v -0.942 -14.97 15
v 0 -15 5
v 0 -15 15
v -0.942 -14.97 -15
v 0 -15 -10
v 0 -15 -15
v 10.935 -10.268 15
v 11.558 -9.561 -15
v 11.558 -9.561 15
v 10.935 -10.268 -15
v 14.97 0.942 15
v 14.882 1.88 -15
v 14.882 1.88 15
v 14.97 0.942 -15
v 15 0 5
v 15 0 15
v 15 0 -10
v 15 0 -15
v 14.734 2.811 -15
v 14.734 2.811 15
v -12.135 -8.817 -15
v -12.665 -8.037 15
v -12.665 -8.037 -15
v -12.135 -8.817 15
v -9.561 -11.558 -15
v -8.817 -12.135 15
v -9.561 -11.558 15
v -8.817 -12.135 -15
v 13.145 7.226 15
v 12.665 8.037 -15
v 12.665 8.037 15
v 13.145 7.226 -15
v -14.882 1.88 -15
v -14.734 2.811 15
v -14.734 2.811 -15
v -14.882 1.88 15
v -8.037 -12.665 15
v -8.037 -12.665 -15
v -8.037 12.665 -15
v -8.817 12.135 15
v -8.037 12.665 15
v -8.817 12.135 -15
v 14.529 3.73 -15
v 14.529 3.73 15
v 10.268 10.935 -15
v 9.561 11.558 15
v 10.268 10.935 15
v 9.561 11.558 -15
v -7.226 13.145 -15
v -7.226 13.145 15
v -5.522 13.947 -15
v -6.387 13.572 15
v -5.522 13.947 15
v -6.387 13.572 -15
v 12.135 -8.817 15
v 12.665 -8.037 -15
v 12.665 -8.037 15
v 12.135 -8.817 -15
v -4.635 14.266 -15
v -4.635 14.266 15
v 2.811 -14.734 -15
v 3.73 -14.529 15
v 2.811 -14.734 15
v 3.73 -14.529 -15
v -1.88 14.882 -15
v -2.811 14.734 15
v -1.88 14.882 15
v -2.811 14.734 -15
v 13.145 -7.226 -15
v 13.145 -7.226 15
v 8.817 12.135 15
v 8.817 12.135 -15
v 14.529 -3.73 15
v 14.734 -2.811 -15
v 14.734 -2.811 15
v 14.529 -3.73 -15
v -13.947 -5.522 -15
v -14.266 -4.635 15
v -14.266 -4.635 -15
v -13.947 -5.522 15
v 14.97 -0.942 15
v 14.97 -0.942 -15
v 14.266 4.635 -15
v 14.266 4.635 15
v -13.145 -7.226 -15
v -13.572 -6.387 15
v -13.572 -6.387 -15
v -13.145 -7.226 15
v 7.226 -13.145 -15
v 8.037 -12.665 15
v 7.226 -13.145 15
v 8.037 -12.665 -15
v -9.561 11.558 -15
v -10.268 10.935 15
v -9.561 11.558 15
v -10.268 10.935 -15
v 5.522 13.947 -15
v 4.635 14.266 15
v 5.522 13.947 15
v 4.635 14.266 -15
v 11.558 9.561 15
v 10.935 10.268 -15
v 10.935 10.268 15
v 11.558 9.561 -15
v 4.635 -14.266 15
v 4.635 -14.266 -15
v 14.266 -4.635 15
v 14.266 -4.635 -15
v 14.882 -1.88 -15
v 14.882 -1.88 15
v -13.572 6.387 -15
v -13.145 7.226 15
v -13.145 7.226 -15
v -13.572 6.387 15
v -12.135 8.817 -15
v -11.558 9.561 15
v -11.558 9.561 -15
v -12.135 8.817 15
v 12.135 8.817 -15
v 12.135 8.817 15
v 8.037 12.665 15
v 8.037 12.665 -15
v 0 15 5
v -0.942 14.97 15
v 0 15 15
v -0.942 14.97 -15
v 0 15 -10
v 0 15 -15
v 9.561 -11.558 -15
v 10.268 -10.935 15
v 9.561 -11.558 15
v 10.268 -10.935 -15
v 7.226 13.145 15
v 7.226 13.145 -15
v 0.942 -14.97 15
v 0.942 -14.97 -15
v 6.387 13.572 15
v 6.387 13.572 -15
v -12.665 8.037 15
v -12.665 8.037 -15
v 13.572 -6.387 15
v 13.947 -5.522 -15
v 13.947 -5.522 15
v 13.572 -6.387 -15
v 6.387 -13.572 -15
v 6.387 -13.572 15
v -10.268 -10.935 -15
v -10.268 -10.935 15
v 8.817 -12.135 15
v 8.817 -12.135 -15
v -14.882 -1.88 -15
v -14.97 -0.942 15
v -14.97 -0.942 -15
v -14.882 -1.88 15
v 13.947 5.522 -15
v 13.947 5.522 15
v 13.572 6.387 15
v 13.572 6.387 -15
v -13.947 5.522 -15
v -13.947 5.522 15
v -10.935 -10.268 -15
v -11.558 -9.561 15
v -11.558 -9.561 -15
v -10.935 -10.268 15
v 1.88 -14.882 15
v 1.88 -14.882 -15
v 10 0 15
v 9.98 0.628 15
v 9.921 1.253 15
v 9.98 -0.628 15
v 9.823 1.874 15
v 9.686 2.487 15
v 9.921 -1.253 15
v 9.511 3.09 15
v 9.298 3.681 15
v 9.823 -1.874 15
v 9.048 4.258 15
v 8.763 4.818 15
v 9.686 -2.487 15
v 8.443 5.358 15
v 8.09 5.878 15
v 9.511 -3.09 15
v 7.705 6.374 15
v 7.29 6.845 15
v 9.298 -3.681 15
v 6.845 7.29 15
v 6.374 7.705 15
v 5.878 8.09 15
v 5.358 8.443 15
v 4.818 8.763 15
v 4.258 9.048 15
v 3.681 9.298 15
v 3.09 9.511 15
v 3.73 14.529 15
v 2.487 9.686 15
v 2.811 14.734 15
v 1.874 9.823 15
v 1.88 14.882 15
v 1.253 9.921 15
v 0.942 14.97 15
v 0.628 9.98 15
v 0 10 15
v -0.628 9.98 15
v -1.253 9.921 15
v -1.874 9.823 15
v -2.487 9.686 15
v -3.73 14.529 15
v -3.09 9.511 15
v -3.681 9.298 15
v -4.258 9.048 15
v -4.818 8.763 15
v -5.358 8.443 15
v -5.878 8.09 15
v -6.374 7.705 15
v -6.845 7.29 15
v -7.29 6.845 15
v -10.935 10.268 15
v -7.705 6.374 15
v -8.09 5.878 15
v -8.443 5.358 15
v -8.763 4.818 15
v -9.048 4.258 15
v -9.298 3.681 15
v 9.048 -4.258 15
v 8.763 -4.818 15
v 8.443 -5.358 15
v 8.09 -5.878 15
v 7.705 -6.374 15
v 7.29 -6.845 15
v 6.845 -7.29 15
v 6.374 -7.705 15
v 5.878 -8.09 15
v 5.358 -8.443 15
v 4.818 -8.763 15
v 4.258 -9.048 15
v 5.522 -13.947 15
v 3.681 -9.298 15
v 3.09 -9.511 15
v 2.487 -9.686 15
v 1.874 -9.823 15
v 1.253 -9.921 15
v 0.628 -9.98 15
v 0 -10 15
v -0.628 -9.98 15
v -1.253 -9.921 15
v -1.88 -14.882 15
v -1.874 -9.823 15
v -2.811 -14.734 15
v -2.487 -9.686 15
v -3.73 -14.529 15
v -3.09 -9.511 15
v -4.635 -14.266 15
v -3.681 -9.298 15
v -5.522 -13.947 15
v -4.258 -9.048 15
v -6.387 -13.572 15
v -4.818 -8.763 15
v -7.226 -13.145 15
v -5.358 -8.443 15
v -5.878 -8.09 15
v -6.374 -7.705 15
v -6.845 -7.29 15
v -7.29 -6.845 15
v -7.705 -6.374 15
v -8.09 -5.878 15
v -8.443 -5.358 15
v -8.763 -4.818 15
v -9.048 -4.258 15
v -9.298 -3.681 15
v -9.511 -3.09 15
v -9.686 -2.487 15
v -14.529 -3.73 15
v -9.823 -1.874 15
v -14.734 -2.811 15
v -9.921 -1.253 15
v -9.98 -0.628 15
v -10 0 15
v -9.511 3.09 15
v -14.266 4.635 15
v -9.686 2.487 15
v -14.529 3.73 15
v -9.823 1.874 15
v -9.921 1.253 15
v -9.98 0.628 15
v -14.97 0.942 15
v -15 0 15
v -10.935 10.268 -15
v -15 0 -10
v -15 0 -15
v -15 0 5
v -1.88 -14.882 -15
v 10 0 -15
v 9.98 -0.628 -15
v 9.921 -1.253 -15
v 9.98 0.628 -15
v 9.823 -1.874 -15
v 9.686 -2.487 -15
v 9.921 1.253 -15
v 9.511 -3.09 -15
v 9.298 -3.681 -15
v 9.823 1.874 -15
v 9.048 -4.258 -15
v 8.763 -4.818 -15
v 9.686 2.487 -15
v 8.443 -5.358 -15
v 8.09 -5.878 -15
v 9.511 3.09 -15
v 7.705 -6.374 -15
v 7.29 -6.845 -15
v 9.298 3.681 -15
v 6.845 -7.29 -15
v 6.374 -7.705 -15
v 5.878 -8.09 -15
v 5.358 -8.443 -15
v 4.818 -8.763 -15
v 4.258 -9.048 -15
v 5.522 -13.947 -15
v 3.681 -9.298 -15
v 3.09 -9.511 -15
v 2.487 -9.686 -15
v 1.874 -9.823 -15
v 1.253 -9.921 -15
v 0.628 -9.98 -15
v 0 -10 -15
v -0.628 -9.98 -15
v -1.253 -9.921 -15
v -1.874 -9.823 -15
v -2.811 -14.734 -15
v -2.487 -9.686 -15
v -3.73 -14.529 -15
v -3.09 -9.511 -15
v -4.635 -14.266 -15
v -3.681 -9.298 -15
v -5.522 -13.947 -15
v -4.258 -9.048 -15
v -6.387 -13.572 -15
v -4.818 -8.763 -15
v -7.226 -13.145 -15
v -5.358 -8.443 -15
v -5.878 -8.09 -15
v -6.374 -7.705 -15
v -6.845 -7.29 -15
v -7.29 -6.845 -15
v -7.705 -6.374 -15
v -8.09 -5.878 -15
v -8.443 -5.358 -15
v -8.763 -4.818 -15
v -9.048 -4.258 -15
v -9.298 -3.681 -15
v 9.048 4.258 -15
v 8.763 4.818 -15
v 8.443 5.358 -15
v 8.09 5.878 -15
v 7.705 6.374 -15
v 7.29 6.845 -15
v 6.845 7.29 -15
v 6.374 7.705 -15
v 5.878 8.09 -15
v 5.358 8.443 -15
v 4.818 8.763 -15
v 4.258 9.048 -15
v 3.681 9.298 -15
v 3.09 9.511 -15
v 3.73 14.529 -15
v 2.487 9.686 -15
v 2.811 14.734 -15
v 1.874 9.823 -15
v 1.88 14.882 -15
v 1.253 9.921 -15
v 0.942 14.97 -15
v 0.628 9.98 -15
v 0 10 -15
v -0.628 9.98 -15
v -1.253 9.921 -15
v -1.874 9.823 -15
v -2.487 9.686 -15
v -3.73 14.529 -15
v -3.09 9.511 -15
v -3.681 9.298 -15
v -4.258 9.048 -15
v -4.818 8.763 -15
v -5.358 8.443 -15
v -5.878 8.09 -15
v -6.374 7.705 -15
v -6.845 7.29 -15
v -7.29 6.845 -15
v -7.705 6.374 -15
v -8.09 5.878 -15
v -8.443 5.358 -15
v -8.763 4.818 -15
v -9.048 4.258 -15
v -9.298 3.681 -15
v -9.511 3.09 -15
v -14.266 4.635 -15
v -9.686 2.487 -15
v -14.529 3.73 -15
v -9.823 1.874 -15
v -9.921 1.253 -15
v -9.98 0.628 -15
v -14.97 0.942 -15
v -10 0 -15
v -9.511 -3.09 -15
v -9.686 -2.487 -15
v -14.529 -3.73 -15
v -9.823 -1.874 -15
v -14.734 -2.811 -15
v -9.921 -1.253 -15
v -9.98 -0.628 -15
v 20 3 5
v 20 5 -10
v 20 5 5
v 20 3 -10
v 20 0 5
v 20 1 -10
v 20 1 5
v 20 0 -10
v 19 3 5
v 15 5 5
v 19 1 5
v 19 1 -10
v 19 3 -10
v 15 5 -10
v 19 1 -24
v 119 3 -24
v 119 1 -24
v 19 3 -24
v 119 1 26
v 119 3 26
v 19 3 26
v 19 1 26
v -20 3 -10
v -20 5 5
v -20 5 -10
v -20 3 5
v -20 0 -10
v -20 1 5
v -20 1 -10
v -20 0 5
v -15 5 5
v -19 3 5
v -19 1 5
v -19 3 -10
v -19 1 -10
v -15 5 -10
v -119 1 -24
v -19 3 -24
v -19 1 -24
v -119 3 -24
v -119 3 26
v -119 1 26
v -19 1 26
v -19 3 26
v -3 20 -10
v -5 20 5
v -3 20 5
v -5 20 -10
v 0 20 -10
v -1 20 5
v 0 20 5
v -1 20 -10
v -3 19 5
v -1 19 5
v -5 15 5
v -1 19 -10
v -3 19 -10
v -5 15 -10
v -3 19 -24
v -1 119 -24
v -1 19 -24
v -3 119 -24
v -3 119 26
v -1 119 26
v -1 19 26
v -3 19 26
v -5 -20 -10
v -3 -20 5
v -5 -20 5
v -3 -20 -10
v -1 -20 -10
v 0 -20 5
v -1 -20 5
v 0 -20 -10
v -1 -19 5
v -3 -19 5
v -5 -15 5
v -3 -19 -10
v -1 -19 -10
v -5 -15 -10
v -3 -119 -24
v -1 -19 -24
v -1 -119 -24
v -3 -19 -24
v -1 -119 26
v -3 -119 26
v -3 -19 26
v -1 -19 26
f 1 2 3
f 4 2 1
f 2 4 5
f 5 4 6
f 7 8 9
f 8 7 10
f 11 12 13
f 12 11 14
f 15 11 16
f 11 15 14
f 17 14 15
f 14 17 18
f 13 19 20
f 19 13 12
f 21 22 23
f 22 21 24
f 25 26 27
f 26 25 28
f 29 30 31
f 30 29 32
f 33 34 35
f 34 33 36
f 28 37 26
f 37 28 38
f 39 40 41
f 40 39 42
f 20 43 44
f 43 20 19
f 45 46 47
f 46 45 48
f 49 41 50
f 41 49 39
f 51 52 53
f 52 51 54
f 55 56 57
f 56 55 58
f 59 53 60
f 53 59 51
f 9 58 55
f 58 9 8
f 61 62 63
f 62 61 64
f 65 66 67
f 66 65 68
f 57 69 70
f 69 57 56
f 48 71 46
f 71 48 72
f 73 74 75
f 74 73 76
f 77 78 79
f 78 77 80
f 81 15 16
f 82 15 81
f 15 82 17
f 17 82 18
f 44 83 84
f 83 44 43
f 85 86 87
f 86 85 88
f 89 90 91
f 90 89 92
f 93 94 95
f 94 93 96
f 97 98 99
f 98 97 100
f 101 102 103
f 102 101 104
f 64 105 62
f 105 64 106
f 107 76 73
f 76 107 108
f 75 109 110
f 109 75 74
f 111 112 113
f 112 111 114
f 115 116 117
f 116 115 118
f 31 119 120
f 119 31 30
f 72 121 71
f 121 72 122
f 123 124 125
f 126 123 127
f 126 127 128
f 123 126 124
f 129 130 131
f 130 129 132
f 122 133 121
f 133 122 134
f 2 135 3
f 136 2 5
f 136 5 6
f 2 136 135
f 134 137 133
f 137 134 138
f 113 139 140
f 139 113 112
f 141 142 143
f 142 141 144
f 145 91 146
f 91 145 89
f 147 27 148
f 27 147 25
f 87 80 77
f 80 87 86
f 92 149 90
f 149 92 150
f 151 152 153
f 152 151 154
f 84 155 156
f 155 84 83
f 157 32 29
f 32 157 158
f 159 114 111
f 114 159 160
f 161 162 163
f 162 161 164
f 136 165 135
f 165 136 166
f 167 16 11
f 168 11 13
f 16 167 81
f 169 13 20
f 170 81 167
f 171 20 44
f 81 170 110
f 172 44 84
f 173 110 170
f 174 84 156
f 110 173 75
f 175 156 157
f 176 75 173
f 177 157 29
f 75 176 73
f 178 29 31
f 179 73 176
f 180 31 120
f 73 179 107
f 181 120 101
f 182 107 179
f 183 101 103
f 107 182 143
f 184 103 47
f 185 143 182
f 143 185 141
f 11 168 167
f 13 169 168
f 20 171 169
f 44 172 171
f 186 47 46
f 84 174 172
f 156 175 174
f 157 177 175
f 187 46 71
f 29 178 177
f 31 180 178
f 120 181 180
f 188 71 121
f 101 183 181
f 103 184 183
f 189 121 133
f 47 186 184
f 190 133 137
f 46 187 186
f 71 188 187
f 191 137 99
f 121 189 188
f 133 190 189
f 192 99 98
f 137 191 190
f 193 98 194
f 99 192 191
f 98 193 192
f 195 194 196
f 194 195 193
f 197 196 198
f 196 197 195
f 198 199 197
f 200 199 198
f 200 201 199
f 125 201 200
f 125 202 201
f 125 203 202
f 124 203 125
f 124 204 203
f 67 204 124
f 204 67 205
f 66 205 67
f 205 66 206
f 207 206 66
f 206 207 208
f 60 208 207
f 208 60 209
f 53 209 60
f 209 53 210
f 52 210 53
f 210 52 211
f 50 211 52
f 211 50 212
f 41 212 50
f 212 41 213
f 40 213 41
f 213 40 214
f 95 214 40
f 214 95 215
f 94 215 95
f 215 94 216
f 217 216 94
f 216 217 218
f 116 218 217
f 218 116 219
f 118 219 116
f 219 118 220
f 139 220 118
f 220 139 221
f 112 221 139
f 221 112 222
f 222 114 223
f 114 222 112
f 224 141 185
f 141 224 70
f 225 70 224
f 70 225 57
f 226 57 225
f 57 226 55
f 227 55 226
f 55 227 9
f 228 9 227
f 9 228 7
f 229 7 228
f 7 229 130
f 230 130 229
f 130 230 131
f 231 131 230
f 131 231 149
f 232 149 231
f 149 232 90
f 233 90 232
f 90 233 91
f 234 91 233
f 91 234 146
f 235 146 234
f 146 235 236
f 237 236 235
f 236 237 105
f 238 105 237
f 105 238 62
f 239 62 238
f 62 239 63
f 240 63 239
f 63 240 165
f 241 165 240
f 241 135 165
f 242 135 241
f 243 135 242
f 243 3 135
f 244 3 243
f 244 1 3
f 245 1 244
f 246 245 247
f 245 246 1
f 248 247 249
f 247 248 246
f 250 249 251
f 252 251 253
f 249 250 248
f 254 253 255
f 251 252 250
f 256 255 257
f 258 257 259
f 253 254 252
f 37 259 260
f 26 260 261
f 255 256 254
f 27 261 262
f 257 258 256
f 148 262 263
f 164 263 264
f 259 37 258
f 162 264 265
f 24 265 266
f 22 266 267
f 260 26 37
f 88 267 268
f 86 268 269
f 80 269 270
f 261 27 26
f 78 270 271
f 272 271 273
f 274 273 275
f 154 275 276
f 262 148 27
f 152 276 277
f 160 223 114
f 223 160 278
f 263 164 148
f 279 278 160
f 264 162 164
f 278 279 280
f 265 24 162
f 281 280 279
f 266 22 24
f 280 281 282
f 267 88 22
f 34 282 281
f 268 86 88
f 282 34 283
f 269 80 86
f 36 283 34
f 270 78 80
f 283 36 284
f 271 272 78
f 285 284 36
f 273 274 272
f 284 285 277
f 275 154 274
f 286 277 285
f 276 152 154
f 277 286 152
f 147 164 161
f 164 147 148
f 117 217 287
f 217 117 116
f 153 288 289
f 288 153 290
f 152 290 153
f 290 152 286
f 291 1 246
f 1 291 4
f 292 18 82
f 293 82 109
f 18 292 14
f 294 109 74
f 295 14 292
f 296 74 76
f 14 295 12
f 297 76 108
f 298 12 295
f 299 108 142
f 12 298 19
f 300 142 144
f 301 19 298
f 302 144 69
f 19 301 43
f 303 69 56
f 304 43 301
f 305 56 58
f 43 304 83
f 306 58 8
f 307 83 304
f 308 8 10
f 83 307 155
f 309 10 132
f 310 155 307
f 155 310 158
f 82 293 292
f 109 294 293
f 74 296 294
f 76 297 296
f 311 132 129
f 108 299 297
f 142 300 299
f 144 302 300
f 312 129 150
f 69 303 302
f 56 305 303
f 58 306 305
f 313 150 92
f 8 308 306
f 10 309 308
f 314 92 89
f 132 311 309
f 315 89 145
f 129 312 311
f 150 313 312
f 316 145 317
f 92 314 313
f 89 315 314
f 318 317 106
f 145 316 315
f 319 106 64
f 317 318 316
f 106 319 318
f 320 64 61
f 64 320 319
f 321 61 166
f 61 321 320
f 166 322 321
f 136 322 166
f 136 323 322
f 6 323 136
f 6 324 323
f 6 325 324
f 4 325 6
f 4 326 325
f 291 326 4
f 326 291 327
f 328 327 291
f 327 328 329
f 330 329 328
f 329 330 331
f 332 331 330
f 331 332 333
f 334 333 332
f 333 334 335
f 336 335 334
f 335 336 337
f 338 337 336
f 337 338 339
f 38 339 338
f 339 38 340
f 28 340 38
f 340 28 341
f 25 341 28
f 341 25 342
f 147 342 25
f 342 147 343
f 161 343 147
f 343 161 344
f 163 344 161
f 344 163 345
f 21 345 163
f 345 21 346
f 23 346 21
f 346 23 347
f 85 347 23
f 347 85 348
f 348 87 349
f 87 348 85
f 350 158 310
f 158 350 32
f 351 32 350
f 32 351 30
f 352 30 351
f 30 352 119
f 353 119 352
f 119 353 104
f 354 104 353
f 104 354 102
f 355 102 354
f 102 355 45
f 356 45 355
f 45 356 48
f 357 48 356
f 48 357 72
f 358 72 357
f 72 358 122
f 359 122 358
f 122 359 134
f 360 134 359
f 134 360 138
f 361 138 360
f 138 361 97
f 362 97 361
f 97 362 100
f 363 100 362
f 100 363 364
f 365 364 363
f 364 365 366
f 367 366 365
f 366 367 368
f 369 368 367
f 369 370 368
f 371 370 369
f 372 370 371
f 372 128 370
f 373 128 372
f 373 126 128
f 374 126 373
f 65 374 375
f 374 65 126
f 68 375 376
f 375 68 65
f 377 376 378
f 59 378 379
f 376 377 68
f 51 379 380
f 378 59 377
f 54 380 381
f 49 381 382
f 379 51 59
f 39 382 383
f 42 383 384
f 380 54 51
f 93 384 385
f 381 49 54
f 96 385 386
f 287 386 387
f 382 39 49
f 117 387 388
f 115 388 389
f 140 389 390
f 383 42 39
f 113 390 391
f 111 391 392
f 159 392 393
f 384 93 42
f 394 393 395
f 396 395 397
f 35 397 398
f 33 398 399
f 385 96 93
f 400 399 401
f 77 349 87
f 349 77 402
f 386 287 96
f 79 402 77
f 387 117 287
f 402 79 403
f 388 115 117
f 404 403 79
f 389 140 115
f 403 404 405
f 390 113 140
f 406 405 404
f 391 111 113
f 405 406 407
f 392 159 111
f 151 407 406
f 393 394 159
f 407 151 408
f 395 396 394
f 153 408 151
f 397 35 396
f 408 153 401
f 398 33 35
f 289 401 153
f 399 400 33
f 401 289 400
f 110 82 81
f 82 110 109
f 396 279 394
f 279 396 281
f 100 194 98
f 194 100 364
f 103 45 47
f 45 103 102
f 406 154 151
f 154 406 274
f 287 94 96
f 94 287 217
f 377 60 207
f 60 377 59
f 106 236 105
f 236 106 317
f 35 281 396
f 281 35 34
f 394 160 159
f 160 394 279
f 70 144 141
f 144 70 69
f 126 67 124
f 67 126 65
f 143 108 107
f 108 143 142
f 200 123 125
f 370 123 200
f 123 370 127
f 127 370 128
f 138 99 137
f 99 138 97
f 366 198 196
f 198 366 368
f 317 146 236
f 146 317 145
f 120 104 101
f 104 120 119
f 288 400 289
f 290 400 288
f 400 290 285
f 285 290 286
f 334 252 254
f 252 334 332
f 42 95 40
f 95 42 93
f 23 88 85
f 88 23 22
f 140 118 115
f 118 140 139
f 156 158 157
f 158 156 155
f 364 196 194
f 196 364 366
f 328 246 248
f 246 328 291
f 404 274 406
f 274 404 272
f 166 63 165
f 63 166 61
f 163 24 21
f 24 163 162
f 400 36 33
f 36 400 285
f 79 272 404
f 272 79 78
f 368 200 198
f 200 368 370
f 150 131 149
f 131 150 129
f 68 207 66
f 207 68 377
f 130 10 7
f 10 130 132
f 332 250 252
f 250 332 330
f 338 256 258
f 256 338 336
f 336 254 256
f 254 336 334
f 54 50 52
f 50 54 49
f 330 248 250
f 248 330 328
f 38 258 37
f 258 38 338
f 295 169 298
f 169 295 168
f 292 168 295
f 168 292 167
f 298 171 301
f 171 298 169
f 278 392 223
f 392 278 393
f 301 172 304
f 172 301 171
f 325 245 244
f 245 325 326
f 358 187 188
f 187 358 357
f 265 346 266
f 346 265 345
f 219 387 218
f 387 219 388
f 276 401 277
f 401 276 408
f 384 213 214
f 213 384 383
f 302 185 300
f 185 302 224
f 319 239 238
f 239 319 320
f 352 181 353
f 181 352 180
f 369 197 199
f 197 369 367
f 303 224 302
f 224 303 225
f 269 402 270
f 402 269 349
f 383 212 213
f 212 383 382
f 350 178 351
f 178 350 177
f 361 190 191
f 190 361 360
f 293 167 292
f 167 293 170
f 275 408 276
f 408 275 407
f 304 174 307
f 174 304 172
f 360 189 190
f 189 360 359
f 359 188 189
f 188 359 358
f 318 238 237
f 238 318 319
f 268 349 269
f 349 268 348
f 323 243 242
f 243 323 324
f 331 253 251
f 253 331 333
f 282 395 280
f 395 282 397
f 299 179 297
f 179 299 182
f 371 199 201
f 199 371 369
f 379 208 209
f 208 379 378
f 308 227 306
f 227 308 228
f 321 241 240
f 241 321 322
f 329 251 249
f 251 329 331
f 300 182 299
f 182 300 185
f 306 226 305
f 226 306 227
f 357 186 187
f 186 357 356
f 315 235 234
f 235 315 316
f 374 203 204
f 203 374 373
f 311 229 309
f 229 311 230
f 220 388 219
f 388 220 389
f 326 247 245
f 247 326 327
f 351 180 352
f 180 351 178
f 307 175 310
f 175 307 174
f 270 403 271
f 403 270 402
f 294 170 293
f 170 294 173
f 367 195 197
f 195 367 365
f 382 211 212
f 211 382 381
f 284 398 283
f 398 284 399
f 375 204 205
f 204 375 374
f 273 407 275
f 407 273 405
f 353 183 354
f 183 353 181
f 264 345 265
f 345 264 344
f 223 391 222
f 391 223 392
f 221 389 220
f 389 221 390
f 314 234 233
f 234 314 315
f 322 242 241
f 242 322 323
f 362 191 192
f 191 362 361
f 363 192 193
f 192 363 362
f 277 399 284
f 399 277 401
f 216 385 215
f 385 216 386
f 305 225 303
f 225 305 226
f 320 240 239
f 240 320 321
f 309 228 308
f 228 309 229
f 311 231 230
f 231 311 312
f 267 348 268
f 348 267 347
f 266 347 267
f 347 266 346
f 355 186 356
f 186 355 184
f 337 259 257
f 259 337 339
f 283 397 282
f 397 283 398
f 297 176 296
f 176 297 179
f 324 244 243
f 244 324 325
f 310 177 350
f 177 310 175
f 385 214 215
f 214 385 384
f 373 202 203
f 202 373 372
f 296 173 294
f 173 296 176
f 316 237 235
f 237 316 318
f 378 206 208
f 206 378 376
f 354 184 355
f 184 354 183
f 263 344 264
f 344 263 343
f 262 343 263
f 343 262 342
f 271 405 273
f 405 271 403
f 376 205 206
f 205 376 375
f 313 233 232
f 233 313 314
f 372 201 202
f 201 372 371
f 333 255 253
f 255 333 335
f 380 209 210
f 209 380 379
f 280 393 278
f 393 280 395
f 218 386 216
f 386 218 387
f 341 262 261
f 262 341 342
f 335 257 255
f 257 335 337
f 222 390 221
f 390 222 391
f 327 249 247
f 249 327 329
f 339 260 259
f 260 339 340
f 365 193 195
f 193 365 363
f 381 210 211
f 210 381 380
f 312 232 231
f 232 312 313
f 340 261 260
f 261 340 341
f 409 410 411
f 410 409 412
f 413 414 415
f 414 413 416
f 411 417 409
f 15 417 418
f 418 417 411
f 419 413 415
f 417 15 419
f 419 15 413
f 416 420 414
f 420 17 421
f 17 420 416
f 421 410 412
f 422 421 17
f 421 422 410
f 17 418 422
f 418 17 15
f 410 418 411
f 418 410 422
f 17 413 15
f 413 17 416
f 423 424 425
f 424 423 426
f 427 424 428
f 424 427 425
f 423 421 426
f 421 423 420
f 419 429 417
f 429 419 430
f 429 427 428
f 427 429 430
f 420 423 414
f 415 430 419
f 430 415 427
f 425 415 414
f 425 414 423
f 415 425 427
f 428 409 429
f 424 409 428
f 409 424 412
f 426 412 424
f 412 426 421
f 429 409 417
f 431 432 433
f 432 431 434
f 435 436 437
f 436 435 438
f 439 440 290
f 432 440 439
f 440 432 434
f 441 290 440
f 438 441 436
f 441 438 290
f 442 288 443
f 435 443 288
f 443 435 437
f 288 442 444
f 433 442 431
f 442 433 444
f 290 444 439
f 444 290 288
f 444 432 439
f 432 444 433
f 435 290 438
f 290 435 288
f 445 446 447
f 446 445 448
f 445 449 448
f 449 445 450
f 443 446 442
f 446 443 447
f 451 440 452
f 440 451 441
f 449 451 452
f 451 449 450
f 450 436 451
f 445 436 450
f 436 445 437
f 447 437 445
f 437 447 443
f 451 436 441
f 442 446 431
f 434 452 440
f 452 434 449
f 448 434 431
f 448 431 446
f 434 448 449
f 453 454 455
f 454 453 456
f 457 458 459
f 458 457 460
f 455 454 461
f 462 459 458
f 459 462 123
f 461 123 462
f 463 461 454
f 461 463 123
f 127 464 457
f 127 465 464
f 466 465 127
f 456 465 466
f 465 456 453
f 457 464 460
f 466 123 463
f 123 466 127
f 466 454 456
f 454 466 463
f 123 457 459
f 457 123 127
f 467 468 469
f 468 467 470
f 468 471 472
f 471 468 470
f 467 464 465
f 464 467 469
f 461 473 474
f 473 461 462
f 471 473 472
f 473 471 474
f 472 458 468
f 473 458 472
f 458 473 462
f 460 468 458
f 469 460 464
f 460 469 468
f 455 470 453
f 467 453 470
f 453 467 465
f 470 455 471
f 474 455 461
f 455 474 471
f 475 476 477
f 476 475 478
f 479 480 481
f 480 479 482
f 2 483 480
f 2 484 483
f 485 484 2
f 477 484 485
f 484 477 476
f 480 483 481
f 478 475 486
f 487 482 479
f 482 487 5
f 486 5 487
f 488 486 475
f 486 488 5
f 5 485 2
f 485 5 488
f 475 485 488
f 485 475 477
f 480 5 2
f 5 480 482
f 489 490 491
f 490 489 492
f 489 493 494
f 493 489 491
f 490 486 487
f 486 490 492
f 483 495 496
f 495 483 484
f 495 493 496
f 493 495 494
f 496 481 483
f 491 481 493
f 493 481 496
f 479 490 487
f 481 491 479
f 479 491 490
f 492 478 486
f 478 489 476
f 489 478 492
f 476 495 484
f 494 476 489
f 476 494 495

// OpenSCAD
/* Marc Amil
Project date: 28/12/2020
Deadline: 30/12/2020

PROJECT: PROPELLER FOR MYCELIUM BIOREACTOR 
four bladed paddle used for a mixing close to the bottom of a tank.
*/
//

//////////////////////////////////////////////////////////////////////////////PARAMETERS////////////////////////////////////////////////////////////////////////////////////
// I assume that every unit is in mm 
$fn = 100;

//BLADE PARAMETERS 
blade_length = 100;  
blade_width = 2;
blade_height = 50;


//HINGE PARAMETERS
hinge_height = 15;
hinge_width = 5;
hinge_length = 5;

//CORE PARAMETERS 
outercore_height = 30;
outercore_radius = 15;
innercore_height = 60;
innercore_radius = 10;

////////////////////////////////////////////////////////////////////////////RENDERS////////////////////////////////////////////////////////////////////////////////////////
core();

translate([20, 0, 25])
union(){
    hinge(hinge_height, hinge_width, hinge_length);
    blades(blade_height, blade_width, blade_length);
}


mirror([1,0,0])
translate([20, 0, 25])
union(){
    hinge(hinge_height, hinge_width, hinge_length);
    blades(blade_height, blade_width, blade_length);
}


rotate([0,0,90])
translate([20, 0, 25])
union(){
    hinge(hinge_height, hinge_width, hinge_length);
    blades(blade_height, blade_width, blade_length);
}


mirror([0,1,0])
rotate([0, 0, 90])
translate([20, 0, 25])
union() {
    hinge(hinge_height, hinge_width, hinge_length);
    blades(blade_height, blade_width, blade_length);
}
//


/////////////////////////////////////////////////////////////////////////////MODULES/////////////////////////////////////////////////////////////////////////////////////

module core(){
   difference(){
       cylinder(h = outercore_height, r = outercore_radius, center = true);
        cylinder(h = innercore_height , r = innercore_radius, center = true);
   }
}


module hinge(hinge_height, hinge_width, hinge_length){
        translate([-5, 0, -35])
        cube([hinge_width, hinge_length, hinge_height]);       
}



module blades(blade_height, blade_width, blade_length){
          rotate([0, 90, 0])
            translate([-1, 1, -1])
            cube([blade_height, blade_width, blade_length]);
}
